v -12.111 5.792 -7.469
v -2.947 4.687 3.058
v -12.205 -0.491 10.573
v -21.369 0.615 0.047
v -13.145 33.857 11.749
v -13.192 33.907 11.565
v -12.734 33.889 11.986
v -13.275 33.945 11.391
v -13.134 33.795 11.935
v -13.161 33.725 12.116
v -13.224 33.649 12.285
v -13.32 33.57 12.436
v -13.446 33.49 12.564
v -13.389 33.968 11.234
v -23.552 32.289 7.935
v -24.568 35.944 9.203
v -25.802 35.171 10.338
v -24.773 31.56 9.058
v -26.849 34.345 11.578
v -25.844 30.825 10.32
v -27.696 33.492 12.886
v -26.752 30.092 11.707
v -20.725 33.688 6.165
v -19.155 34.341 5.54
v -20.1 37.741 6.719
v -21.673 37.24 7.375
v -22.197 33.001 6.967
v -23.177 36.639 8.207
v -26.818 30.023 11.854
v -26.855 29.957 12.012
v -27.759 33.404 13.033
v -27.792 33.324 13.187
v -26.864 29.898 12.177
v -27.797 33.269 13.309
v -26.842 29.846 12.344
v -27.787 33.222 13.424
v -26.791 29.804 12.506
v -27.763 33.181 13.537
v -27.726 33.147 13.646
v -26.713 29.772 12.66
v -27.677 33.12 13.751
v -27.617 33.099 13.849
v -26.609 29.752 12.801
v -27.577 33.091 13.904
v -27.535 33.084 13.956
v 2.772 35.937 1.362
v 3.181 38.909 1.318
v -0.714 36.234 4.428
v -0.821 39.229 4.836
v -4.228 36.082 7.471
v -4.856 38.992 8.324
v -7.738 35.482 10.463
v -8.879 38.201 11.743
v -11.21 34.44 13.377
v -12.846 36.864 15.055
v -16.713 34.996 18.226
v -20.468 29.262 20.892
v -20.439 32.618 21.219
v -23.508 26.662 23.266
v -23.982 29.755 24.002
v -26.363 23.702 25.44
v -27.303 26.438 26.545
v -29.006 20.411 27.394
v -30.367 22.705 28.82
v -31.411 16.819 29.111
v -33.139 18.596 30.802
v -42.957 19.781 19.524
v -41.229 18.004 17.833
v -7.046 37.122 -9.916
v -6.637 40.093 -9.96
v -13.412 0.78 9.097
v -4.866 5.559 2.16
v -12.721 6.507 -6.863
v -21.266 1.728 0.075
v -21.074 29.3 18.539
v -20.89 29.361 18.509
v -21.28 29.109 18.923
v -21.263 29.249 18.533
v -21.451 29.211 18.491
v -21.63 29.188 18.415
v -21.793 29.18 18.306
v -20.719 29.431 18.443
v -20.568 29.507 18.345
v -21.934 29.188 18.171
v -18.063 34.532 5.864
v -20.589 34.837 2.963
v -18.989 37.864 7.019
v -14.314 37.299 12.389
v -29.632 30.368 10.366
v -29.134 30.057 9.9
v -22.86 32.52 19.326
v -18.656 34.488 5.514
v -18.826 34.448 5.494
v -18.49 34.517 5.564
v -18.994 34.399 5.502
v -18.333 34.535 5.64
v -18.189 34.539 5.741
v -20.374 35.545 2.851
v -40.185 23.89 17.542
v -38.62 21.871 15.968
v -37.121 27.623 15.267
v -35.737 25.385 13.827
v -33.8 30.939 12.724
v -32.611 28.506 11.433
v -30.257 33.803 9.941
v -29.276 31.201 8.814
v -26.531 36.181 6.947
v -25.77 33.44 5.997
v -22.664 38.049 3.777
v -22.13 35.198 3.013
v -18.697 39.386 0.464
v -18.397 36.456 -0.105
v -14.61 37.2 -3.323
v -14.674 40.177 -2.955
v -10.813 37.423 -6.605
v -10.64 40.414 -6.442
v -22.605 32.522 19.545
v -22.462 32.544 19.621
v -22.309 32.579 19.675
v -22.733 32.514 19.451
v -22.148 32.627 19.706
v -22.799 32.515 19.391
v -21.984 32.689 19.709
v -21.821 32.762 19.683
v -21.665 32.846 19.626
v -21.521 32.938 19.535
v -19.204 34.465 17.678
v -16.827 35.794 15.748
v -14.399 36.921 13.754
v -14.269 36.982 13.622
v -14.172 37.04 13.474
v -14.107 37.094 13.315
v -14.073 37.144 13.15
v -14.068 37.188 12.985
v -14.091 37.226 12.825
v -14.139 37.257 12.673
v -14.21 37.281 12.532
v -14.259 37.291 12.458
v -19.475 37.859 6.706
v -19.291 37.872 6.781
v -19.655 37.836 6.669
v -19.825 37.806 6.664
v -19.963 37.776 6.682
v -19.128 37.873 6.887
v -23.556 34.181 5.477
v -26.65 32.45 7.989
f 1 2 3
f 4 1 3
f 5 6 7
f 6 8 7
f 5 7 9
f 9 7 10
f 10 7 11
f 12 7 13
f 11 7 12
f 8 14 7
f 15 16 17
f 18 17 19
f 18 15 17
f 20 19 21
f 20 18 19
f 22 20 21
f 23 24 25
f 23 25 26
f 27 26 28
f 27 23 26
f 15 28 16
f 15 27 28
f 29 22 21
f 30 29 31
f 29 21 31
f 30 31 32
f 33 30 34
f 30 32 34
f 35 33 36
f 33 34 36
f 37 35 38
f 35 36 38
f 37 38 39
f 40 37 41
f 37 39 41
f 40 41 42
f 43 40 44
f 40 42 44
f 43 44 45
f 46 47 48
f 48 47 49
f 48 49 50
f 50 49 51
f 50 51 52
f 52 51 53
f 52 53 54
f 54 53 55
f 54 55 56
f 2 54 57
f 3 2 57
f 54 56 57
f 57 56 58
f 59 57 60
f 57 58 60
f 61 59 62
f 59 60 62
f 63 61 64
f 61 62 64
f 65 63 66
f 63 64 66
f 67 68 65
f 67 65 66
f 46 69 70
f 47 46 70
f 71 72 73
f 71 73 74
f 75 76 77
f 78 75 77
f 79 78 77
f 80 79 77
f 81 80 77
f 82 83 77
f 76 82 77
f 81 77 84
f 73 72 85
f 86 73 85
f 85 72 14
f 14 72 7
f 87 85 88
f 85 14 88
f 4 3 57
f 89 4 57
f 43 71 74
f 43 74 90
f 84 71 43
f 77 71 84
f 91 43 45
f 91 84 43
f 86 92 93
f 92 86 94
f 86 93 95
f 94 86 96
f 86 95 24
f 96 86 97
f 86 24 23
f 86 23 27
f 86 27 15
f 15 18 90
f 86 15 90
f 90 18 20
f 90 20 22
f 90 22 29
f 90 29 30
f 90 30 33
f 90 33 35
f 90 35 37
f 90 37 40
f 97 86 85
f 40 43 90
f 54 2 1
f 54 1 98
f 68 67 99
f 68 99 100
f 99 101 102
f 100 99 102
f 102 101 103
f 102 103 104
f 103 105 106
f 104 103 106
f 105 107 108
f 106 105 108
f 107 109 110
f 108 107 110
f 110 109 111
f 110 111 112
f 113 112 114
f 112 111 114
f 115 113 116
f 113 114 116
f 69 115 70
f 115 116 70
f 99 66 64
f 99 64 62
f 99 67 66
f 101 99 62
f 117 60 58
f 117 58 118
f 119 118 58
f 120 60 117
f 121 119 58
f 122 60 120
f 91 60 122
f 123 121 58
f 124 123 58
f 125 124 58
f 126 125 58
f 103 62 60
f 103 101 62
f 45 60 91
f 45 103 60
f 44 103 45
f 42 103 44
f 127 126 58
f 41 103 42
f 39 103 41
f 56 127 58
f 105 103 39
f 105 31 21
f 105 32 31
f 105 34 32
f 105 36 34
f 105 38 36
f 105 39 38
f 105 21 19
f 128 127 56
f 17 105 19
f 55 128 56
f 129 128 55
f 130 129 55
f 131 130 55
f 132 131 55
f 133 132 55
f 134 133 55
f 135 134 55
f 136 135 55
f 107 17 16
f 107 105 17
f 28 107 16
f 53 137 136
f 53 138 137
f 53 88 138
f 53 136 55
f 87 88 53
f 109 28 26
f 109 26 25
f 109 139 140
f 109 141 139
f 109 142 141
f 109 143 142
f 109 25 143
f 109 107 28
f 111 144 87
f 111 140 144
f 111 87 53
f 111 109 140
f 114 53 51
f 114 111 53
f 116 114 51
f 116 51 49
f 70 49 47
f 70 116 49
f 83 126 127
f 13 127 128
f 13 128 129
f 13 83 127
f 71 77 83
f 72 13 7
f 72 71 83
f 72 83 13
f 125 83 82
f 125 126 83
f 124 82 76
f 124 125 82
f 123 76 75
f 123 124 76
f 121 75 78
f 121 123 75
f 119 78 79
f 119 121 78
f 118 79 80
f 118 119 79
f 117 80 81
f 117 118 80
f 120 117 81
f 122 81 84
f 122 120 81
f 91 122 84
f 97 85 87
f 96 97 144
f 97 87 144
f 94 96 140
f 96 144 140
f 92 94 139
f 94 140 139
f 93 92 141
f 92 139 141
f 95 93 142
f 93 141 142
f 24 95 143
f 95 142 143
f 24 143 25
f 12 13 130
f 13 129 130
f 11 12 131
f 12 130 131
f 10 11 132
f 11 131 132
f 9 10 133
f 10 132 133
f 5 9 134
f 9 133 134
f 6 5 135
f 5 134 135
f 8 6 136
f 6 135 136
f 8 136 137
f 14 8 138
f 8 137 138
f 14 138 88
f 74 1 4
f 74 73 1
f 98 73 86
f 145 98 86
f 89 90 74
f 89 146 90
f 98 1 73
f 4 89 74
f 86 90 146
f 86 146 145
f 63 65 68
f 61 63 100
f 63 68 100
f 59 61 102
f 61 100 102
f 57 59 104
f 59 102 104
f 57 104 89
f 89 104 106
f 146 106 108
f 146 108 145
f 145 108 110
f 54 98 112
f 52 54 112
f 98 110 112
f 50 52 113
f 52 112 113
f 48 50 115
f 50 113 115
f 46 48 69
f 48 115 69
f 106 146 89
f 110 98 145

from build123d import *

# Parameters (mm, degrees)
EXTRUDE_DEPTH               = 5
EXTRUDE001_DEPTH            = 5
THICKNESS_T                 = 1
BOX_W                       = 12
BOX_H                       = 31
BOX_DEPTH                   = 15
BOX001_W                    = 13
BOX001_H                    = 34
BOX001_DEPTH                = 14
CYLINDER001_W               = 48
CYLINDER001_H               = 15
CYLINDER001_ANGLE           = 60
CYLINDER001_PLACEMENT_ANGLE = 60
CYLINDER_W                  = 51
CYLINDER_H                  = 15
CYLINDER_ANGLE              = 60
CYLINDER_PLACEMENT_ANGLE    = 60
CUT002_ROLL_ANGLE           = 157.1428266503
CUT002_PITCH_ANGLE          = -35.3174864898
CUT002_PLACEMENT_ANGLE      = -150.7827400319


with BuildPart() as extrude_body:
    # Common_cs → Extrude (new body)
    with BuildSketch(Plane(origin=(8.5, 45, 6), x_dir=(1, 0, 0), z_dir=(0, 1, 0))):
        with BuildLine():
            Line((5, 4), (-5, 4))
            Line((-5, 4), (-5, -3.1421356237))
            ThreePointArc((-5, -3.1421356237), (-2.5365296809, -3.7839783948), (0, -4))
            ThreePointArc((0, -4), (2.5365296809, -3.7839783948), (5, -3.1421356237))
            Line((5, -3.1421356237), (5, 4))
        make_face()
    extrude(amount=EXTRUDE_DEPTH)


with BuildPart() as extrude001:
    # Common_cs001 → Extrude001 (new body)
    with BuildSketch(Plane(origin=(8.5, 45, 6), x_dir=(1, 0, 0), z_dir=(0, 1, 0))):
        with BuildLine():
            Line((5, 4), (-5, 4))
            Line((-5, 4), (-5, -3.1421356237))
            ThreePointArc((-5, -3.1421356237), (-2.5365296809, -3.7839783948), (0, -4))
            ThreePointArc((0, -4), (2.5365296809, -3.7839783948), (5, -3.1421356237))
            Line((5, -3.1421356237), (5, 4))
        make_face()
    extrude(amount=EXTRUDE001_DEPTH)


with BuildPart() as bolt_bottle_side_opening:
    # Thickness base: copy of Extrude body
    add(extrude_body.part)

    # Thickness
    thickness_openings = [bolt_bottle_side_opening.faces().sort_by_distance(p)[0] for p in [
        (8.5, 50, 5.862901),
    ]]
    offset(amount=THICKNESS_T, openings=thickness_openings)

    # Fusion: union Extrude body, Extrude001
    add(extrude_body.part)
    add(extrude001.part)


with BuildPart() as bolt_bottle_side_opening_1:
    # Fusion placement: moved
    add(bolt_bottle_side_opening.part.moved(Location((0, -7, 1))))


with BuildPart() as pullbay:
    # Box → Box (new body)
    with BuildSketch(Plane(origin=(2.5, 7, 2), x_dir=(1, 0, 0), z_dir=(0, 0, 1))):
        with Locations((6, 15.5)):
            Rectangle(BOX_W, BOX_H)
    extrude(amount=BOX_DEPTH)


with BuildPart() as cut_bay_from_case:
    # Box001 → Box001 (new body)
    with BuildSketch(Plane(origin=(2, 6, 0), x_dir=(1, 0, 0), z_dir=(0, 0, 1))):
        with Locations((6.5, 17)):
            Rectangle(BOX001_W, BOX001_H)
    extrude(amount=BOX001_DEPTH)

    # Cut001: cut pullBay
    add(pullbay.part, mode=Mode.SUBTRACT)


with BuildPart() as bottle_wall001:
    # Cylinder001 → Cylinder001 (revolve)
    with BuildSketch(Plane.XZ):
        with Locations((24, 7.5)):
            Rectangle(CYLINDER001_W, CYLINDER001_H)
    revolve(axis=Axis((0, 0, 0), (0, 0, 1)), revolution_arc=CYLINDER001_ANGLE)


with BuildPart() as bottle_wall001_1:
    # Cylinder001 placement: moved
    add(bottle_wall001.part.moved(Location((8.5, -7, 0))).rotate(Axis((8.5, -7, 0), (0, 0, 1)), CYLINDER001_PLACEMENT_ANGLE))


with BuildPart() as hole_cut_out_of_case:
    # Cylinder → Cylinder (revolve)
    with BuildSketch(Plane.XZ):
        with Locations((25.5, 7.5)):
            Rectangle(CYLINDER_W, CYLINDER_H)
    revolve(axis=Axis((0, 0, 0), (0, 0, 1)), revolution_arc=CYLINDER_ANGLE)


with BuildPart() as hole_cut_out_of_case_1:
    # Cylinder placement: moved
    add(hole_cut_out_of_case.part.moved(Location((8.5, -7, 0))).rotate(Axis((8.5, -7, 0), (0, 0, 1)), CYLINDER_PLACEMENT_ANGLE))

    # Cut: cut bottle_wall001
    add(bottle_wall001_1.part, mode=Mode.SUBTRACT)


with BuildPart() as hole_cut_out_of_case_2:
    # Cut placement: moved
    add(hole_cut_out_of_case_1.part.moved(Location((0, -2, 0))))

    # Fusion001: union cut bay from case
    add(cut_bay_from_case.part)

    # Cut002: cut bolt_bottle_side_opening
    add(bolt_bottle_side_opening_1.part, mode=Mode.SUBTRACT)


with BuildPart() as hole_cut_out_of_case_3:
    # Cut002 roll: moved
    add(hole_cut_out_of_case_2.part.rotate(Axis((0, 0, 0), (1, 0, 0)), CUT002_ROLL_ANGLE))


with BuildPart() as hole_cut_out_of_case_4:
    # Cut002 pitch: moved
    add(hole_cut_out_of_case_3.part.rotate(Axis((0, 0, 0), (0, 1, 0)), CUT002_PITCH_ANGLE))


with BuildPart() as hole_cut_out_of_case_5:
    # Cut002 placement: moved
    add(hole_cut_out_of_case_4.part.rotate(Axis((0, 0, 0), (0, 0, 1)), CUT002_PLACEMENT_ANGLE))


solid = hole_cut_out_of_case_5.part
